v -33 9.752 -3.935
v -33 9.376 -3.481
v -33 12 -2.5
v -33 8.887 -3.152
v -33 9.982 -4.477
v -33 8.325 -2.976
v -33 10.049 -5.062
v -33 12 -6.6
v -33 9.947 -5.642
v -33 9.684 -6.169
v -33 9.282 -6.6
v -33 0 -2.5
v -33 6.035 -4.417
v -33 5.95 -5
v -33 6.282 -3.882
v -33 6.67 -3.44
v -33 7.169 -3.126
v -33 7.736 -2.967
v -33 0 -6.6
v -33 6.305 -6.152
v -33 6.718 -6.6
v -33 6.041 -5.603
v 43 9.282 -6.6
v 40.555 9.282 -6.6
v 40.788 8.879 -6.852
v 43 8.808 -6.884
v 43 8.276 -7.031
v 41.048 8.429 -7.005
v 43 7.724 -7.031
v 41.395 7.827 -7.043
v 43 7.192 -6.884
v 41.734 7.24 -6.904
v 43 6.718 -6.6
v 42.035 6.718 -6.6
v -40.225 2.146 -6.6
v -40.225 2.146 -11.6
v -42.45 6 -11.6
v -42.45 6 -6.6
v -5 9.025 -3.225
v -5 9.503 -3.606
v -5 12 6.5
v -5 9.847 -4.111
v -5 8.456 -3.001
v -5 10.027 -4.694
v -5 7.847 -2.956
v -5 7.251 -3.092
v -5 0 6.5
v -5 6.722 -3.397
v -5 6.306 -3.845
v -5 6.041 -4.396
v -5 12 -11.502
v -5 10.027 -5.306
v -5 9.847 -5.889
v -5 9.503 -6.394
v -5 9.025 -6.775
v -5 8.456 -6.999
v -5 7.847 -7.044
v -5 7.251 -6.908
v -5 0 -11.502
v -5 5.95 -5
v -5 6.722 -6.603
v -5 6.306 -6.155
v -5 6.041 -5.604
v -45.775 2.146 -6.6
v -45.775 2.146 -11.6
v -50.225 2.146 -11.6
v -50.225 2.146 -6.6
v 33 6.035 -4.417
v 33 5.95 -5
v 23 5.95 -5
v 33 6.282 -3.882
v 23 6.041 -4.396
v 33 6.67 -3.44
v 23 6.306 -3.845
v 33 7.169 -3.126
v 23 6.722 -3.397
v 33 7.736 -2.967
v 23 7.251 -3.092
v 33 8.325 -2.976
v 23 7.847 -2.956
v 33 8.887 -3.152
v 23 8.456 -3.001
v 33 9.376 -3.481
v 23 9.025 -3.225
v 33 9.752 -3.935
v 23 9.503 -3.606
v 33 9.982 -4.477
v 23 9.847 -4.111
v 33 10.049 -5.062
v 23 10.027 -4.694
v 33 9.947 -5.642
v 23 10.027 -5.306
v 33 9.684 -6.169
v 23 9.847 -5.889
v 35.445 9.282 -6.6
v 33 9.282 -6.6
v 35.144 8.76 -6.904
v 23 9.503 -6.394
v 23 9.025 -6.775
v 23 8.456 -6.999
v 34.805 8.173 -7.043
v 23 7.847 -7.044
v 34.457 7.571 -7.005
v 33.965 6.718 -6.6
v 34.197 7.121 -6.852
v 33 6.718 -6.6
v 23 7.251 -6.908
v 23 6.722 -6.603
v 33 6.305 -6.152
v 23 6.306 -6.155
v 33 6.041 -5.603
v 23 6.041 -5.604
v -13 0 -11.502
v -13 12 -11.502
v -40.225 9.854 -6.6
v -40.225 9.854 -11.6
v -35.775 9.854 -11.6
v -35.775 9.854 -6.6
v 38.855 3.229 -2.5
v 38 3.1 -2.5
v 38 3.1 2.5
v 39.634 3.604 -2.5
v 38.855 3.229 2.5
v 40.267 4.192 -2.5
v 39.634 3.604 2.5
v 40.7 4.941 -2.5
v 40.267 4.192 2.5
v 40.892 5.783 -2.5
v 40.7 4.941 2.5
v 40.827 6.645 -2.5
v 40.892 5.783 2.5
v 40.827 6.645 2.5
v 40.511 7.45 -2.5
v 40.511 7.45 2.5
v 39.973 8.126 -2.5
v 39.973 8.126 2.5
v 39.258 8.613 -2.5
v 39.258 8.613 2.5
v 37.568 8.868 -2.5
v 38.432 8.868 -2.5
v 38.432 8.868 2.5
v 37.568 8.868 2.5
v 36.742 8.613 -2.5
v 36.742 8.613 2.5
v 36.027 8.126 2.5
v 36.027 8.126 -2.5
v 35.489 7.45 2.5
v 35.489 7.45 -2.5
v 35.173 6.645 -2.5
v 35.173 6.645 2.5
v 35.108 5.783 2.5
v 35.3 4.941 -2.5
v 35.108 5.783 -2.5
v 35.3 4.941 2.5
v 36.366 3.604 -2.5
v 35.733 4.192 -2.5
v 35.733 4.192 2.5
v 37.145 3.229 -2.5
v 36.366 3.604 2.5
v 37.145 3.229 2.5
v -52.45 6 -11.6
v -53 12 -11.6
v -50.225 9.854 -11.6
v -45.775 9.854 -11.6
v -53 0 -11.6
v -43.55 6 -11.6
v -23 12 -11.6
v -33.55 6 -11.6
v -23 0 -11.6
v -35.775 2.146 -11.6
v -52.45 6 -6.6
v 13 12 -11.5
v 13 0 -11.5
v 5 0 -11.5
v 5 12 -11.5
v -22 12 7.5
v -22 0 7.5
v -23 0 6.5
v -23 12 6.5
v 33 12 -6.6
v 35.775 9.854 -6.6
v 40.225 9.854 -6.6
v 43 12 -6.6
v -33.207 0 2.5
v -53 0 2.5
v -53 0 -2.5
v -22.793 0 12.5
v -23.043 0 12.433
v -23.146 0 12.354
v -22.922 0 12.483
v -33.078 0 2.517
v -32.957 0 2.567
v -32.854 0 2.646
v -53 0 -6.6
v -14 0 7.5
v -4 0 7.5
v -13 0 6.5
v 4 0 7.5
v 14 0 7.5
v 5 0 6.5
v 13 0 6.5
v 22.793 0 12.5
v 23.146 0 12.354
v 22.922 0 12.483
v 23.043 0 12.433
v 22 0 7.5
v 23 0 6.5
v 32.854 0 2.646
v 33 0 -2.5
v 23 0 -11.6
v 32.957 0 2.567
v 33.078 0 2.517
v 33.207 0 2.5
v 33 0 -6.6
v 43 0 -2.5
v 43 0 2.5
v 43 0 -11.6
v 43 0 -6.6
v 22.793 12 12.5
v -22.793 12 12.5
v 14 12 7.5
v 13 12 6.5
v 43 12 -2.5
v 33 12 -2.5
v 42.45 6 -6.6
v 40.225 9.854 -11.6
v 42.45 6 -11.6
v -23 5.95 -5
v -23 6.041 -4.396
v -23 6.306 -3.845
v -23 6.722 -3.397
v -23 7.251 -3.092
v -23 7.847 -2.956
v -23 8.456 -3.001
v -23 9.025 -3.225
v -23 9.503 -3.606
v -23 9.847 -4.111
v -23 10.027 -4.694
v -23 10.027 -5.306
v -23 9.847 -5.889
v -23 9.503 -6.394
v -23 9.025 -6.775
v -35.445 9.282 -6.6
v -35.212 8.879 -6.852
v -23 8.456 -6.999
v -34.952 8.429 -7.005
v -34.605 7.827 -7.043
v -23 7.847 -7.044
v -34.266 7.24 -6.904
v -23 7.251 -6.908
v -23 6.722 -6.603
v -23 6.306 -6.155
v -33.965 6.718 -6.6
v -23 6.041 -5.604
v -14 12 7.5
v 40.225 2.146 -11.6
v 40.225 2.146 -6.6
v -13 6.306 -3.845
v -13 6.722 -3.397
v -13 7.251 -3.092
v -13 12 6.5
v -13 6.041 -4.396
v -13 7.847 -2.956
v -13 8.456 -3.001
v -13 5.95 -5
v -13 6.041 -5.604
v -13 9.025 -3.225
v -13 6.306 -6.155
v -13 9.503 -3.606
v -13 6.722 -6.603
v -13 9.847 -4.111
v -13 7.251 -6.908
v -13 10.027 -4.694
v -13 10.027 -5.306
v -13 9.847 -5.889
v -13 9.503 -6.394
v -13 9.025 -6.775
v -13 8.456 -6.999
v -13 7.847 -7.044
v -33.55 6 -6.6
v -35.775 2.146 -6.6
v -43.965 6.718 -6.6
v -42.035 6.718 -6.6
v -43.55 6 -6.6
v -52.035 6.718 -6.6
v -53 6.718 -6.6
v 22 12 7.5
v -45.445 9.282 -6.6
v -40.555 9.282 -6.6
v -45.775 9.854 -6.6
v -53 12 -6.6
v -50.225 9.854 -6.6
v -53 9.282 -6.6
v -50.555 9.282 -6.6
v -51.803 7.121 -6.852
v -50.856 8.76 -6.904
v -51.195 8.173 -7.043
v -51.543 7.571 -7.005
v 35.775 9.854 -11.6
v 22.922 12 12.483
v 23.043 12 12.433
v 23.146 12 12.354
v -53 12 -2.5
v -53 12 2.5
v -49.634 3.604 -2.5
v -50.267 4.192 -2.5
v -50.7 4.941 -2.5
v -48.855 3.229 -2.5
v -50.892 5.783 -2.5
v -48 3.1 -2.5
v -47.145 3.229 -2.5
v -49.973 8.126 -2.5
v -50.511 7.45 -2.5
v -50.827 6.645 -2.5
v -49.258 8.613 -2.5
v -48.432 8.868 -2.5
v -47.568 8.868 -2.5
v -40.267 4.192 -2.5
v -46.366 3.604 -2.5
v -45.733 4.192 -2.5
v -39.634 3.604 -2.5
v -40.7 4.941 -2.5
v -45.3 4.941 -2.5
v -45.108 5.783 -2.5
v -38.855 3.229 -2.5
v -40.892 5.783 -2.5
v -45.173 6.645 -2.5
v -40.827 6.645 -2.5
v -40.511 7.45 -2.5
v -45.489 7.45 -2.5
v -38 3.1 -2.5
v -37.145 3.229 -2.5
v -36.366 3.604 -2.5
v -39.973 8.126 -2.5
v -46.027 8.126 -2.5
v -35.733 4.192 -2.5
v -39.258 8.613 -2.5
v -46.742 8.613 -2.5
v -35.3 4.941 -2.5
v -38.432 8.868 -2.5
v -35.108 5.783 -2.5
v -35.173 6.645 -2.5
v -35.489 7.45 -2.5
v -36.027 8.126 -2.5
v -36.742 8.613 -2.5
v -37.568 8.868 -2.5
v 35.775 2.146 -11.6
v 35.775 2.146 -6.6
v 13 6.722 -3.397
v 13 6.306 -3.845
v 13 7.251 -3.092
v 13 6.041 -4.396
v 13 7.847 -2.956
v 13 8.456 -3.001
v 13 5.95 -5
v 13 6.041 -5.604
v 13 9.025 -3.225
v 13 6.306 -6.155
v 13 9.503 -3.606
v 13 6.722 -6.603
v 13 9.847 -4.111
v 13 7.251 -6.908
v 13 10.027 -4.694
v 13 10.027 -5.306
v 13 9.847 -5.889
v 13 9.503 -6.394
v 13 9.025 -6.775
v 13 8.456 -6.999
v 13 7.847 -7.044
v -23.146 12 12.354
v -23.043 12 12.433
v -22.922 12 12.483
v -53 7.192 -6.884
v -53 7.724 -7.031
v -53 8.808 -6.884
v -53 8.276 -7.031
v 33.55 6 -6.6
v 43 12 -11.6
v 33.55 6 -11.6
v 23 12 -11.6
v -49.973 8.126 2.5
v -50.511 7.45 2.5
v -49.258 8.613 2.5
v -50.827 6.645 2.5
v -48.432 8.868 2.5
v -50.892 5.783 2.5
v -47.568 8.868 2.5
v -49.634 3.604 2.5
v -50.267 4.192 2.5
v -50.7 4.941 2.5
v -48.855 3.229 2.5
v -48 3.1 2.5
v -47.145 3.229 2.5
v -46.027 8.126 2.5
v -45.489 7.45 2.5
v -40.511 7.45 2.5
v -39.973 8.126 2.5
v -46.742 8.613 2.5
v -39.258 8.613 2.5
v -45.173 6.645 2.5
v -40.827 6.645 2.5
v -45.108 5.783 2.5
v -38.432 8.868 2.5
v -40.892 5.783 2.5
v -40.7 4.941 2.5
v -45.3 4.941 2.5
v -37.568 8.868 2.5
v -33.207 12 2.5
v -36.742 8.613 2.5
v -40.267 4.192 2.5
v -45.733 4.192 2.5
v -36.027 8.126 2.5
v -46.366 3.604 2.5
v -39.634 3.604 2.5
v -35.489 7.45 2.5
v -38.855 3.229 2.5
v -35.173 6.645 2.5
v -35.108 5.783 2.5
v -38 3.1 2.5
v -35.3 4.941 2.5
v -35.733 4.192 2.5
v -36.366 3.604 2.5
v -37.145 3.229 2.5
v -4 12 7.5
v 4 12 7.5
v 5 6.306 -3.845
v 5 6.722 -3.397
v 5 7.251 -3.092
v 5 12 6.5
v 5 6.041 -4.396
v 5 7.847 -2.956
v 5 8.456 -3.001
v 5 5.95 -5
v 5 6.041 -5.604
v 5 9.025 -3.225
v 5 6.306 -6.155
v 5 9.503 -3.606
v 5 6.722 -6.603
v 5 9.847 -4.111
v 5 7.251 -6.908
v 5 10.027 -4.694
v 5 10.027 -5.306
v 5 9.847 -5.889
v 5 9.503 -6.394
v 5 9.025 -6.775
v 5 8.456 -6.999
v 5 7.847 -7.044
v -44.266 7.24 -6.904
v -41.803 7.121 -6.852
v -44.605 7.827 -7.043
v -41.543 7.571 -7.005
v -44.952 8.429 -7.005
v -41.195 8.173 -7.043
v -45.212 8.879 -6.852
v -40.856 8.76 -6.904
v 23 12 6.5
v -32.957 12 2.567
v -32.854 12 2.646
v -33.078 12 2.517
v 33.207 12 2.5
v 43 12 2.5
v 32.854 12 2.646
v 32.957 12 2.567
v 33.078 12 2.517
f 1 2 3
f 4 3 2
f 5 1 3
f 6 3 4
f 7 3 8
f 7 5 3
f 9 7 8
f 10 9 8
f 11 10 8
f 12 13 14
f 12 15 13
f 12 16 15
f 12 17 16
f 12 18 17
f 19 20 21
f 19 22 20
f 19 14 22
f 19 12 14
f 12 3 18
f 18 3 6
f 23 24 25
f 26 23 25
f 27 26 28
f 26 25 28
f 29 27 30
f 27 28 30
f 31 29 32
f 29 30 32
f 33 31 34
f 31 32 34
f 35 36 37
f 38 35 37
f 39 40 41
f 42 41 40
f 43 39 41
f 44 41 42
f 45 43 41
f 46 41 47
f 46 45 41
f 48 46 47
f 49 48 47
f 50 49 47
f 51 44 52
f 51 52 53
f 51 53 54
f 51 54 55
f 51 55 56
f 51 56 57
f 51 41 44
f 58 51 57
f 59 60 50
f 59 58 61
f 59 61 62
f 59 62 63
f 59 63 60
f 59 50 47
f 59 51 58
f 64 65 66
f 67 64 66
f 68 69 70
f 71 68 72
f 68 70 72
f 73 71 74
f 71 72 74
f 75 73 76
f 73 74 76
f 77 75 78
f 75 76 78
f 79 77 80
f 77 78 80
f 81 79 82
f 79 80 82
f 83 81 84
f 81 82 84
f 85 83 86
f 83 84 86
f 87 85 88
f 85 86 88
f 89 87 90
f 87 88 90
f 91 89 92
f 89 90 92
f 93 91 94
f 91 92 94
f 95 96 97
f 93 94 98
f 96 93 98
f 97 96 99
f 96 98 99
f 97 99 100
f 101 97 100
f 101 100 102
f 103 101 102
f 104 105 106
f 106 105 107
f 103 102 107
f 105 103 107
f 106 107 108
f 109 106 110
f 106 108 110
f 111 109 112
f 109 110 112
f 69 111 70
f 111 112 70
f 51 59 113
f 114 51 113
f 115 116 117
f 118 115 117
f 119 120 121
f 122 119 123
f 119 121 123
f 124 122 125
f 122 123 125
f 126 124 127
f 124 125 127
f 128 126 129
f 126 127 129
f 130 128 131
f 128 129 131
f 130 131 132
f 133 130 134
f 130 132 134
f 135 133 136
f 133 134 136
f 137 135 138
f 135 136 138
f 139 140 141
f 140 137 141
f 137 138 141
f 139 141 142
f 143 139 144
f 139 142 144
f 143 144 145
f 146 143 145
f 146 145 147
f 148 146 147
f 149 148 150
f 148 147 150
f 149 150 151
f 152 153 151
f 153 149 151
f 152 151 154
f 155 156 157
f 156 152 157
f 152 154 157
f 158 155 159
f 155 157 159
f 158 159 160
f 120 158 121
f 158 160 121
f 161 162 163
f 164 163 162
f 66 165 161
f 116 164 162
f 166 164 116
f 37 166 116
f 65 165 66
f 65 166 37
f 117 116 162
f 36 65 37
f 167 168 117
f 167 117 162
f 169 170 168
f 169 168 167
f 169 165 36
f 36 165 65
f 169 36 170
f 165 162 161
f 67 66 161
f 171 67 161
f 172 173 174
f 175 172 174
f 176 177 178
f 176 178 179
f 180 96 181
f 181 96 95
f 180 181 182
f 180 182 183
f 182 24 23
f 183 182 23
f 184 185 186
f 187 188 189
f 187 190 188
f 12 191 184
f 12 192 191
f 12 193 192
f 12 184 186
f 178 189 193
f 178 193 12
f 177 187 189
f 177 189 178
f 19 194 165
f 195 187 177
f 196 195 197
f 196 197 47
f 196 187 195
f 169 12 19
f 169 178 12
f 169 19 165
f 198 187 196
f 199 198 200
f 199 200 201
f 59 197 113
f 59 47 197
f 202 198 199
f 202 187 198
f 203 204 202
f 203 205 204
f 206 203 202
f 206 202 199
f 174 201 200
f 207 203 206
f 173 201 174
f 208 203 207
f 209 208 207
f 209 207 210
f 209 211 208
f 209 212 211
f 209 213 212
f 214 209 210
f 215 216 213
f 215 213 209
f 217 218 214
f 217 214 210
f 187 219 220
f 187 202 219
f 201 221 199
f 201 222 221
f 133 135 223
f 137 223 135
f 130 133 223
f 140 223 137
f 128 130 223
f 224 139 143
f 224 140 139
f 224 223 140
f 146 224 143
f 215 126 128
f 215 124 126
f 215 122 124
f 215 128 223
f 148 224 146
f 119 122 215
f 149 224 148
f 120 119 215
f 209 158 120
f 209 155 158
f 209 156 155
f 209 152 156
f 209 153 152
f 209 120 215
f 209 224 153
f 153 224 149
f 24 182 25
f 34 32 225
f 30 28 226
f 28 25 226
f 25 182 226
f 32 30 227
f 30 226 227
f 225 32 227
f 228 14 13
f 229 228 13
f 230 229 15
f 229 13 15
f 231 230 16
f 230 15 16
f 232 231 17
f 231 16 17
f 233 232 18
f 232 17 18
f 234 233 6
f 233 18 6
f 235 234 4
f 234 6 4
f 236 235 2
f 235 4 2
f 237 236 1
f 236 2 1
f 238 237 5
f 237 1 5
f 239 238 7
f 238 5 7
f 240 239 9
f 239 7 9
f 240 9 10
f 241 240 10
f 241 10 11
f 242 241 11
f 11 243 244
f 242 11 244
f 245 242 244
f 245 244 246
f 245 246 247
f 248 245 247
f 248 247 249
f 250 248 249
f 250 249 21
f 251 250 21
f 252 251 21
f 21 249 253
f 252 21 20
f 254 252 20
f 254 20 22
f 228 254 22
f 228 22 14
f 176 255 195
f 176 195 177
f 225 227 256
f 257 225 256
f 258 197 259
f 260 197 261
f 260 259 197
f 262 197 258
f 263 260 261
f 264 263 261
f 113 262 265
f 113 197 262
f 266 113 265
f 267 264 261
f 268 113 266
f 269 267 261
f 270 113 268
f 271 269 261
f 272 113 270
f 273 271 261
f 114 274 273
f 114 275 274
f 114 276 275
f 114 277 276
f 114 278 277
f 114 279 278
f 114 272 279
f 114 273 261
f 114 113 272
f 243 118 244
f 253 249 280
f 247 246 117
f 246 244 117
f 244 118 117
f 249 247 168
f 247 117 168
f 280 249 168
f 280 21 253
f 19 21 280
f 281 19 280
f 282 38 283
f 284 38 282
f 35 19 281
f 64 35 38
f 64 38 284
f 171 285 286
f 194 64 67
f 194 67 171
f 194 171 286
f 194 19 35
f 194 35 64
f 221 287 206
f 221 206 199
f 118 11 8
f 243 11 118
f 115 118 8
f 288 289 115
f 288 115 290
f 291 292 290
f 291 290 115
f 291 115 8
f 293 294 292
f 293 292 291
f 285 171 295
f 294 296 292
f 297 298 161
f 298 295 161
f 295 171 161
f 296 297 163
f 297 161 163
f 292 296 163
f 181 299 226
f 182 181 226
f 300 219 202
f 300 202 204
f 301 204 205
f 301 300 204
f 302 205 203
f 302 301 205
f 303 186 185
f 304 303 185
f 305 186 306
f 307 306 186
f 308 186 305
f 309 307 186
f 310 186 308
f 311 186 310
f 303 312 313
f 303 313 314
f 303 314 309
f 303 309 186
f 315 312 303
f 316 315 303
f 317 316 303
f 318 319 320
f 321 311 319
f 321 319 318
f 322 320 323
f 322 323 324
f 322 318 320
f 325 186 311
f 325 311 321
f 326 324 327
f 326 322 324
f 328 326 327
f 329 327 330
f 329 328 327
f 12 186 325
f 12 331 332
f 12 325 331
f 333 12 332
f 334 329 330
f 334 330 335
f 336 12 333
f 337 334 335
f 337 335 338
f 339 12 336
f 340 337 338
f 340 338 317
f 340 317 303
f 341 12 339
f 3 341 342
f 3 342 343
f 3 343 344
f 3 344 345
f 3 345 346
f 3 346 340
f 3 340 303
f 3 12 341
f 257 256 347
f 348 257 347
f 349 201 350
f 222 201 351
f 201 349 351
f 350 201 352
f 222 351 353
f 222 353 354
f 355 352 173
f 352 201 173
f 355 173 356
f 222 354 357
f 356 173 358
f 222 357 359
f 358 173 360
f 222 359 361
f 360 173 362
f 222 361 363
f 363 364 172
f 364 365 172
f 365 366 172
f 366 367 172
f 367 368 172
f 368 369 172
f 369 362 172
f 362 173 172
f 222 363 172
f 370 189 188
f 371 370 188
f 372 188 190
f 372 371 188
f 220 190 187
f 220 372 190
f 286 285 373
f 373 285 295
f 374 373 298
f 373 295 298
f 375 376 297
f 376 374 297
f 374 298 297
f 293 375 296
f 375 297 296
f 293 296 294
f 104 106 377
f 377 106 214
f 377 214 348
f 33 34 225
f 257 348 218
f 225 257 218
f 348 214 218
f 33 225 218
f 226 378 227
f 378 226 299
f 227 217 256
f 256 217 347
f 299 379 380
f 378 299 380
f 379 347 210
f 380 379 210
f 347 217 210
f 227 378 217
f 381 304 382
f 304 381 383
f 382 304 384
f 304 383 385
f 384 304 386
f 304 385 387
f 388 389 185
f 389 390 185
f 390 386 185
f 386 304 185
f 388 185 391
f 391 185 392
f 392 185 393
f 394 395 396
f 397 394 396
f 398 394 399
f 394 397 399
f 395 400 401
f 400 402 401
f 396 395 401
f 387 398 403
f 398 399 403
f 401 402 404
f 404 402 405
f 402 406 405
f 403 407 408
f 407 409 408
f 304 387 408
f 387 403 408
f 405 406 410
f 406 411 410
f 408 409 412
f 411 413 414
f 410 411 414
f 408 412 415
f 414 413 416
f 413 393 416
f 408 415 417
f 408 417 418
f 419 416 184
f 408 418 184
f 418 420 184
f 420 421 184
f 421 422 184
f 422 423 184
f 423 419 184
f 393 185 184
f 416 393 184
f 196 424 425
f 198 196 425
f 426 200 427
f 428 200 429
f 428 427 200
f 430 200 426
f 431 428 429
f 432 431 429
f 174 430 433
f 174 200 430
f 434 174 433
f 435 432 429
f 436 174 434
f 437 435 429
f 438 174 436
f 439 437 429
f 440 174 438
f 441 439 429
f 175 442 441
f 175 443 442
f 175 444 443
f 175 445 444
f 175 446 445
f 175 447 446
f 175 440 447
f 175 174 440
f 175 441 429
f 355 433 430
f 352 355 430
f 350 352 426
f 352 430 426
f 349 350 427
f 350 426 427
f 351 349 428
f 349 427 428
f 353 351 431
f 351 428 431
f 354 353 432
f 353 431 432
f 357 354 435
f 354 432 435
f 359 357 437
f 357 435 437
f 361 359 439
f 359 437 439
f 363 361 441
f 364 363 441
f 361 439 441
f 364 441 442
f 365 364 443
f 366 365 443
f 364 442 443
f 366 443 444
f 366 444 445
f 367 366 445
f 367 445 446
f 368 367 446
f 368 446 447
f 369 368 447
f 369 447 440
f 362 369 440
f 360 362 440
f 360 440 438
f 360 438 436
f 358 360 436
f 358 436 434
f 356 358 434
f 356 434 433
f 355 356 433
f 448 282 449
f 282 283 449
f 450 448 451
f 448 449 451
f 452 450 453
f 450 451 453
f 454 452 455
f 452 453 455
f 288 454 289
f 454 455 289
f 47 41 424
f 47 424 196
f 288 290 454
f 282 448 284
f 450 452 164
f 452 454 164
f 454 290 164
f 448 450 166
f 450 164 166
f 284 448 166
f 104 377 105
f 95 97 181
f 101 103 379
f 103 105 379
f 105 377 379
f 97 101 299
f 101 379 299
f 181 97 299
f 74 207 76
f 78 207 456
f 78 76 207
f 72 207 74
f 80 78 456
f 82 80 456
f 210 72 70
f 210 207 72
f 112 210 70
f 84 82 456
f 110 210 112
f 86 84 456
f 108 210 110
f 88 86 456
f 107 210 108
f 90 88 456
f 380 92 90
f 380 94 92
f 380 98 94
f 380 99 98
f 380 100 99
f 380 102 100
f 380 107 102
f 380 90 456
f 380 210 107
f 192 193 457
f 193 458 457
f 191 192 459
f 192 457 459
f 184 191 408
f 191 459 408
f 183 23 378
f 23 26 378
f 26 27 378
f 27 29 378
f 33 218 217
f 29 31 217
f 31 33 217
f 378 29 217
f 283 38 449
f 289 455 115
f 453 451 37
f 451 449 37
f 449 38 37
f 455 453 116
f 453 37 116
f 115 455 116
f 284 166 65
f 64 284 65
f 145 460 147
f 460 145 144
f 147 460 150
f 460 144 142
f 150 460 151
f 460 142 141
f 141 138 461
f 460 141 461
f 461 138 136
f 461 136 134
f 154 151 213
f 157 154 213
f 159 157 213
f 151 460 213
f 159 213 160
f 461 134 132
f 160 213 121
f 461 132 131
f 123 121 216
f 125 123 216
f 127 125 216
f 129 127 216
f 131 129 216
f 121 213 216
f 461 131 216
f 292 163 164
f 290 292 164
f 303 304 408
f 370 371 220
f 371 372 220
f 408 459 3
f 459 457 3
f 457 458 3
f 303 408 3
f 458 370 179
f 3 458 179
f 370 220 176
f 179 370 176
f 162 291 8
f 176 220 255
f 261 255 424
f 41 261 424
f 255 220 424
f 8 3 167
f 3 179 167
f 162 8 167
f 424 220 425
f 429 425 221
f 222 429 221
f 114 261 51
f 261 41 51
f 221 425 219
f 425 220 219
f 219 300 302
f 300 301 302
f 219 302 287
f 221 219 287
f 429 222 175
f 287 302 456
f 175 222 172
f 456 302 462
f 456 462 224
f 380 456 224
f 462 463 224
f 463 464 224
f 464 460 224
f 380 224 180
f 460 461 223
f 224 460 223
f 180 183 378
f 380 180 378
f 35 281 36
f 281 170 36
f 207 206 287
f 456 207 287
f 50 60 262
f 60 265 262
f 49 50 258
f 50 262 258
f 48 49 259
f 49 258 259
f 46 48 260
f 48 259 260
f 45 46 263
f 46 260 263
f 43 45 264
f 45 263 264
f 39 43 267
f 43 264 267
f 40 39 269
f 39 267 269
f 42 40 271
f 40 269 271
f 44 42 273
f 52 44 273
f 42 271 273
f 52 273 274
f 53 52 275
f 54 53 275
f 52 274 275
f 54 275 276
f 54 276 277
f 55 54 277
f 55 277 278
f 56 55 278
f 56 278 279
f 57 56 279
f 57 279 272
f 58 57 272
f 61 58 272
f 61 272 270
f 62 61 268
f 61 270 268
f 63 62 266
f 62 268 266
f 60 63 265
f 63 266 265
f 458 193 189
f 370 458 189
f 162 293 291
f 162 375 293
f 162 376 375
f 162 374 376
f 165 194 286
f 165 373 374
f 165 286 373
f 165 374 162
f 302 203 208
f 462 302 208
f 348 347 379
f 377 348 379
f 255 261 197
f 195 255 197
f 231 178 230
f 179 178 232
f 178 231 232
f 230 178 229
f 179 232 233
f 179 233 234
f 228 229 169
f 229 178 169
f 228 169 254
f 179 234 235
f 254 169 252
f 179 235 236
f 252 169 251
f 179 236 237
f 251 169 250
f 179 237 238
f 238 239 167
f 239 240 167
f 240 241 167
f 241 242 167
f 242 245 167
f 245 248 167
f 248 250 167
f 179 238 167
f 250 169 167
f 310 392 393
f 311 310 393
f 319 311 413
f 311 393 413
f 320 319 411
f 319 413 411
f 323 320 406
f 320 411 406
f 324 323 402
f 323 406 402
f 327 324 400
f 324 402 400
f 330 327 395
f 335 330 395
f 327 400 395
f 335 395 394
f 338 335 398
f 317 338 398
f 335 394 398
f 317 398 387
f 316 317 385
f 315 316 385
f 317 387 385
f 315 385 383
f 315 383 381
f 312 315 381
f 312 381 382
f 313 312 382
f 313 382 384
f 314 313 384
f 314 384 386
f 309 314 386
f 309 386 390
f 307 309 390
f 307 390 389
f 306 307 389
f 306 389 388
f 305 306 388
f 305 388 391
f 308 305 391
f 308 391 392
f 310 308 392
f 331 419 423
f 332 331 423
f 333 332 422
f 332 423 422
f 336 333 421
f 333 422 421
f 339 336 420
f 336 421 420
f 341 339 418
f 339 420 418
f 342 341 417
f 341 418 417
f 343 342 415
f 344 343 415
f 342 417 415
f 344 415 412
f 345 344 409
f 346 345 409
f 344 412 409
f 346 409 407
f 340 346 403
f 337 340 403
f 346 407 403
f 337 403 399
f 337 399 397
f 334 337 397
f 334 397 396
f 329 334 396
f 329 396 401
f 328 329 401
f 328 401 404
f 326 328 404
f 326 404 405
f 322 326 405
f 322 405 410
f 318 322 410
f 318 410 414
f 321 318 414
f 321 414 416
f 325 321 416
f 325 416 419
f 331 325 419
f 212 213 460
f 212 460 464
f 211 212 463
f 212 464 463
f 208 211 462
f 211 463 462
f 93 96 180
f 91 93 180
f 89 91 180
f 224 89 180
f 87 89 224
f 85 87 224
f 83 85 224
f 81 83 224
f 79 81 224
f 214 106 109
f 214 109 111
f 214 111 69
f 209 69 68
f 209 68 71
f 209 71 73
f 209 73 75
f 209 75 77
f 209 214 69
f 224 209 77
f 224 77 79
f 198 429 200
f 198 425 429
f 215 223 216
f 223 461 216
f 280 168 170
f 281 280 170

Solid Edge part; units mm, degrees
sketch "Sketch1" plane through (0, 0, 0) normal (0, -1, 0) x (1, 0, 0)
  line L0 (-33, -12.5) -> (33, -12.5)
  line L1 (33, -12.5) -> (33, 12.5)
  line L2 (33, 12.5) -> (-33, 12.5)
  line L3 (-33, 12.5) -> (-33, -12.5)
  dimension "D1" = 66
  dimension "D2" = 25
extrude "Protrusion1" add sketch "Sketch1" against normal blind 12
sketch "Sketch2" plane through (0, 6, -12.5) normal (0, 0, -1) x (1, 0, 0)
  line L0 (13, 6) -> (13, -6)
  line L1 (13, -6) -> (23, -6)
  line L2 (23, 6) -> (23, -6)
  line L3 (13, 6) -> (23, 6)
  line L4 (-5, 6) -> (5, 6)
  line L5 (5, 6) -> (5, -6)
  line L6 (5, -6) -> (-5, -6)
  line L7 (-5, -6) -> (-5, 6)
  line L8 (-23, 6) -> (-23, -6)
  line L9 (-23, -6) -> (-13, -6)
  line L10 (-13, 6) -> (-13, -6)
  line L11 (-23, 6) -> (-13, 6)
  dimension "D1" = 10
  dimension "D2" = 10
  dimension "D3" = 10
  dimension "D4" = 46
  dimension "D5" = 10
  dimension "D6" = 13
extrude "Extrusionsausschnitt_1" cut sketch "Sketch2" against normal blind 20
sketch "Sketch3" plane through (-33, 6, 0) normal (-1, 0, 0) x (0, -1, 0)
  line L0 (-6, 12.5) -> (6, 12.5)
  line L1 (6, 12.5) -> (6, -2.5)
  line L2 (6, -2.5) -> (-6, -2.5)
  line L3 (-6, -2.5) -> (-6, 12.5)
  dimension "D1" = 10
extrude "Extrusionsausprägung_2" add sketch "Sketch3" along normal blind 20
mirror "Mirror1" about plane through (0, 0, 0) normal (1, 0, 0) of "Extrusionsausprägung_2"
sketch "Sketch4" plane through (0, 0, 0) normal (0, -1, 0) x (1, 0, 0)
  line L0 (-33, -10.5) -> (33, -10.5)
  dimension "D1" = 8
extrude "Extrusionsausschnitt_3" cut sketch "Sketch4" against normal blind 62.4108 material side at (0, 0, -10.55)
sketch "Sketch5" plane through (0, 0, 1) normal (0, -1, 0) x (1, 0, 0)
  line L0 (-53, 1.5) -> (-33, 1.5)
  line L1 (-33, 1.5) -> (-23, 11.5)
  dimension "D1" = 20
  dimension "D2" = 5
extrude "Extrusionsausschnitt_4" cut sketch "Sketch5" against normal blind 64.7066 material side at (-43, 0, 2.55)
hole "Bohrung_1" at (-48, 6, 2.5) direction (0, 0, -1) diameter 5.8 end up to next
hole "Hole1" at (-38, 6, 2.5) direction (0, 0, -1) diameter 5.8 end up to next
fillet "Verrundung_1" radius 0.5 2 edges at (-33, 6, 2.5) (-23, 6, 12.5)
chamfer "Fase_1" distance 1 angle 45 4 edges at (-23, 6, 7.5) (-13, 6, 7.5) (13, 6, 7.5) (23, 6, 7.5)
mirror "Mirror2" about plane through (0, 0, 0) normal (1, 0, 0) of "Extrusionsausschnitt_4", "Bohrung_1", "Hole1"
fillet "Round1" radius 0.5 2 edges at (33, 6, 2.5) (23, 6, 12.5)
chamfer "Chamfer1" [suppressed]
sketch "Sketch6" plane through (43.1036, 6, 2.5) normal (0, 0, 1) x (1, 0, 0)
  line L0 (-0.1036, 6) -> (-0.1036, -6)
  dimension "D1" = 5
extrude "Extrusionsausschnitt_6" cut sketch "Sketch6" against normal blind 27.3244 material side at (43.05, 6, 2.5)
chamfer "Fase_3" distance 1 angle 45 2 edges at (-5, 6, 7.5) (5, 6, 7.5)
sketch "Sketch7" plane through (-5, 0, 1) normal (0, -1, 0) x (1, 0, 0)
  line L0 (-28, -7.6) -> (-48, -7.6)
  line L1 (-48, -7.6) -> (-48, -12.6)
  line L2 (-48, -12.6) -> (-18, -12.6)
  line L3 (-18, -12.6) -> (-18, -11.5)
  line L4 (-18, -11.5) -> (-28, -11.5)
  line L5 (-28, -11.5) -> (-28, -7.6)
  line L6 (38, -7.6) -> (48, -7.6)
  line L7 (48, -7.6) -> (48, -12.6)
  line L8 (48, -12.6) -> (28, -12.6)
  line L9 (28, -12.6) -> (28, -11.5)
  line L10 (28, -11.5) -> (38, -11.5)
  line L11 (38, -11.5) -> (38, -7.6)
  line L12 (-8, -11.5) -> (0, -11.5)
  line L13 (0, -11.5) -> (0, -12.5024)
  line L14 (0, -12.5024) -> (-8, -12.5024)
  line L15 (-8, -12.5024) -> (-8, -11.5)
  line L16 (10, -11.5) -> (18, -11.5)
  line L17 (18, -11.5) -> (18, -12.5)
  line L18 (18, -12.5) -> (10, -12.5)
  line L19 (10, -12.5) -> (10, -11.5)
  dimension "D1" = 5
  dimension "D2" = 4.1
  dimension "D3" = 5
  dimension "D4" = 4.1
  dimension "D5" = 1.0024
  dimension "D6" = 1
extrude "Protrusion3" add sketch "Sketch7" against normal up to vertex (12 mm away)
sketch "Sketch8" plane through (-38, 6, -11.6) normal (0, 0, -1) x (1, 0, 0)
  line L0 (-12.225, 3.8538) -> (-14.45, 0)
  line L1 (-14.45, 0) -> (-12.225, -3.8538)
  line L2 (-12.225, -3.8538) -> (-7.775, -3.8538)
  line L3 (-7.775, -3.8538) -> (-5.55, 0)
  line L4 (-5.55, 0) -> (-7.775, 3.8538)
  line L5 (-7.775, 3.8538) -> (-12.225, 3.8538)
  line L6 (-2.225, 3.8538) -> (-4.45, 0)
  line L7 (-4.45, 0) -> (-2.225, -3.8538)
  line L8 (-2.225, -3.8538) -> (2.225, -3.8538)
  line L9 (2.225, -3.8538) -> (4.45, 0)
  line L10 (4.45, 0) -> (2.225, 3.8538)
  line L11 (2.225, 3.8538) -> (-2.225, 3.8538)
  line L12 (73.775, 3.8538) -> (71.55, 0)
  line L13 (71.55, 0) -> (73.775, -3.8538)
  line L14 (73.775, -3.8538) -> (78.225, -3.8538)
  line L15 (78.225, -3.8538) -> (80.45, 0)
  line L16 (80.45, 0) -> (78.225, 3.8538)
  line L17 (78.225, 3.8538) -> (73.775, 3.8538)
  dimension "D1" = 8.9
  dimension "D2" = 8.9
  dimension "D3" = 8.9
extrude "Cutout2" cut sketch "Sketch8" against normal blind 5
sketch "Sketch9" plane through (-33, 6, -3) normal (-1, 0, 0) x (0, -1, 0)
  circle A0 centre (-2, -2) radius 2.05
  dimension "D1" = 4.1
  dimension "D2" = 2.5
  dimension "D3" = 4
extrude "Cutout3" cut sketch "Sketch9" along normal up to vertex (20 mm away) and the other way up to vertex (76 mm away)
properties part number "6" material "Polykarbonat"
